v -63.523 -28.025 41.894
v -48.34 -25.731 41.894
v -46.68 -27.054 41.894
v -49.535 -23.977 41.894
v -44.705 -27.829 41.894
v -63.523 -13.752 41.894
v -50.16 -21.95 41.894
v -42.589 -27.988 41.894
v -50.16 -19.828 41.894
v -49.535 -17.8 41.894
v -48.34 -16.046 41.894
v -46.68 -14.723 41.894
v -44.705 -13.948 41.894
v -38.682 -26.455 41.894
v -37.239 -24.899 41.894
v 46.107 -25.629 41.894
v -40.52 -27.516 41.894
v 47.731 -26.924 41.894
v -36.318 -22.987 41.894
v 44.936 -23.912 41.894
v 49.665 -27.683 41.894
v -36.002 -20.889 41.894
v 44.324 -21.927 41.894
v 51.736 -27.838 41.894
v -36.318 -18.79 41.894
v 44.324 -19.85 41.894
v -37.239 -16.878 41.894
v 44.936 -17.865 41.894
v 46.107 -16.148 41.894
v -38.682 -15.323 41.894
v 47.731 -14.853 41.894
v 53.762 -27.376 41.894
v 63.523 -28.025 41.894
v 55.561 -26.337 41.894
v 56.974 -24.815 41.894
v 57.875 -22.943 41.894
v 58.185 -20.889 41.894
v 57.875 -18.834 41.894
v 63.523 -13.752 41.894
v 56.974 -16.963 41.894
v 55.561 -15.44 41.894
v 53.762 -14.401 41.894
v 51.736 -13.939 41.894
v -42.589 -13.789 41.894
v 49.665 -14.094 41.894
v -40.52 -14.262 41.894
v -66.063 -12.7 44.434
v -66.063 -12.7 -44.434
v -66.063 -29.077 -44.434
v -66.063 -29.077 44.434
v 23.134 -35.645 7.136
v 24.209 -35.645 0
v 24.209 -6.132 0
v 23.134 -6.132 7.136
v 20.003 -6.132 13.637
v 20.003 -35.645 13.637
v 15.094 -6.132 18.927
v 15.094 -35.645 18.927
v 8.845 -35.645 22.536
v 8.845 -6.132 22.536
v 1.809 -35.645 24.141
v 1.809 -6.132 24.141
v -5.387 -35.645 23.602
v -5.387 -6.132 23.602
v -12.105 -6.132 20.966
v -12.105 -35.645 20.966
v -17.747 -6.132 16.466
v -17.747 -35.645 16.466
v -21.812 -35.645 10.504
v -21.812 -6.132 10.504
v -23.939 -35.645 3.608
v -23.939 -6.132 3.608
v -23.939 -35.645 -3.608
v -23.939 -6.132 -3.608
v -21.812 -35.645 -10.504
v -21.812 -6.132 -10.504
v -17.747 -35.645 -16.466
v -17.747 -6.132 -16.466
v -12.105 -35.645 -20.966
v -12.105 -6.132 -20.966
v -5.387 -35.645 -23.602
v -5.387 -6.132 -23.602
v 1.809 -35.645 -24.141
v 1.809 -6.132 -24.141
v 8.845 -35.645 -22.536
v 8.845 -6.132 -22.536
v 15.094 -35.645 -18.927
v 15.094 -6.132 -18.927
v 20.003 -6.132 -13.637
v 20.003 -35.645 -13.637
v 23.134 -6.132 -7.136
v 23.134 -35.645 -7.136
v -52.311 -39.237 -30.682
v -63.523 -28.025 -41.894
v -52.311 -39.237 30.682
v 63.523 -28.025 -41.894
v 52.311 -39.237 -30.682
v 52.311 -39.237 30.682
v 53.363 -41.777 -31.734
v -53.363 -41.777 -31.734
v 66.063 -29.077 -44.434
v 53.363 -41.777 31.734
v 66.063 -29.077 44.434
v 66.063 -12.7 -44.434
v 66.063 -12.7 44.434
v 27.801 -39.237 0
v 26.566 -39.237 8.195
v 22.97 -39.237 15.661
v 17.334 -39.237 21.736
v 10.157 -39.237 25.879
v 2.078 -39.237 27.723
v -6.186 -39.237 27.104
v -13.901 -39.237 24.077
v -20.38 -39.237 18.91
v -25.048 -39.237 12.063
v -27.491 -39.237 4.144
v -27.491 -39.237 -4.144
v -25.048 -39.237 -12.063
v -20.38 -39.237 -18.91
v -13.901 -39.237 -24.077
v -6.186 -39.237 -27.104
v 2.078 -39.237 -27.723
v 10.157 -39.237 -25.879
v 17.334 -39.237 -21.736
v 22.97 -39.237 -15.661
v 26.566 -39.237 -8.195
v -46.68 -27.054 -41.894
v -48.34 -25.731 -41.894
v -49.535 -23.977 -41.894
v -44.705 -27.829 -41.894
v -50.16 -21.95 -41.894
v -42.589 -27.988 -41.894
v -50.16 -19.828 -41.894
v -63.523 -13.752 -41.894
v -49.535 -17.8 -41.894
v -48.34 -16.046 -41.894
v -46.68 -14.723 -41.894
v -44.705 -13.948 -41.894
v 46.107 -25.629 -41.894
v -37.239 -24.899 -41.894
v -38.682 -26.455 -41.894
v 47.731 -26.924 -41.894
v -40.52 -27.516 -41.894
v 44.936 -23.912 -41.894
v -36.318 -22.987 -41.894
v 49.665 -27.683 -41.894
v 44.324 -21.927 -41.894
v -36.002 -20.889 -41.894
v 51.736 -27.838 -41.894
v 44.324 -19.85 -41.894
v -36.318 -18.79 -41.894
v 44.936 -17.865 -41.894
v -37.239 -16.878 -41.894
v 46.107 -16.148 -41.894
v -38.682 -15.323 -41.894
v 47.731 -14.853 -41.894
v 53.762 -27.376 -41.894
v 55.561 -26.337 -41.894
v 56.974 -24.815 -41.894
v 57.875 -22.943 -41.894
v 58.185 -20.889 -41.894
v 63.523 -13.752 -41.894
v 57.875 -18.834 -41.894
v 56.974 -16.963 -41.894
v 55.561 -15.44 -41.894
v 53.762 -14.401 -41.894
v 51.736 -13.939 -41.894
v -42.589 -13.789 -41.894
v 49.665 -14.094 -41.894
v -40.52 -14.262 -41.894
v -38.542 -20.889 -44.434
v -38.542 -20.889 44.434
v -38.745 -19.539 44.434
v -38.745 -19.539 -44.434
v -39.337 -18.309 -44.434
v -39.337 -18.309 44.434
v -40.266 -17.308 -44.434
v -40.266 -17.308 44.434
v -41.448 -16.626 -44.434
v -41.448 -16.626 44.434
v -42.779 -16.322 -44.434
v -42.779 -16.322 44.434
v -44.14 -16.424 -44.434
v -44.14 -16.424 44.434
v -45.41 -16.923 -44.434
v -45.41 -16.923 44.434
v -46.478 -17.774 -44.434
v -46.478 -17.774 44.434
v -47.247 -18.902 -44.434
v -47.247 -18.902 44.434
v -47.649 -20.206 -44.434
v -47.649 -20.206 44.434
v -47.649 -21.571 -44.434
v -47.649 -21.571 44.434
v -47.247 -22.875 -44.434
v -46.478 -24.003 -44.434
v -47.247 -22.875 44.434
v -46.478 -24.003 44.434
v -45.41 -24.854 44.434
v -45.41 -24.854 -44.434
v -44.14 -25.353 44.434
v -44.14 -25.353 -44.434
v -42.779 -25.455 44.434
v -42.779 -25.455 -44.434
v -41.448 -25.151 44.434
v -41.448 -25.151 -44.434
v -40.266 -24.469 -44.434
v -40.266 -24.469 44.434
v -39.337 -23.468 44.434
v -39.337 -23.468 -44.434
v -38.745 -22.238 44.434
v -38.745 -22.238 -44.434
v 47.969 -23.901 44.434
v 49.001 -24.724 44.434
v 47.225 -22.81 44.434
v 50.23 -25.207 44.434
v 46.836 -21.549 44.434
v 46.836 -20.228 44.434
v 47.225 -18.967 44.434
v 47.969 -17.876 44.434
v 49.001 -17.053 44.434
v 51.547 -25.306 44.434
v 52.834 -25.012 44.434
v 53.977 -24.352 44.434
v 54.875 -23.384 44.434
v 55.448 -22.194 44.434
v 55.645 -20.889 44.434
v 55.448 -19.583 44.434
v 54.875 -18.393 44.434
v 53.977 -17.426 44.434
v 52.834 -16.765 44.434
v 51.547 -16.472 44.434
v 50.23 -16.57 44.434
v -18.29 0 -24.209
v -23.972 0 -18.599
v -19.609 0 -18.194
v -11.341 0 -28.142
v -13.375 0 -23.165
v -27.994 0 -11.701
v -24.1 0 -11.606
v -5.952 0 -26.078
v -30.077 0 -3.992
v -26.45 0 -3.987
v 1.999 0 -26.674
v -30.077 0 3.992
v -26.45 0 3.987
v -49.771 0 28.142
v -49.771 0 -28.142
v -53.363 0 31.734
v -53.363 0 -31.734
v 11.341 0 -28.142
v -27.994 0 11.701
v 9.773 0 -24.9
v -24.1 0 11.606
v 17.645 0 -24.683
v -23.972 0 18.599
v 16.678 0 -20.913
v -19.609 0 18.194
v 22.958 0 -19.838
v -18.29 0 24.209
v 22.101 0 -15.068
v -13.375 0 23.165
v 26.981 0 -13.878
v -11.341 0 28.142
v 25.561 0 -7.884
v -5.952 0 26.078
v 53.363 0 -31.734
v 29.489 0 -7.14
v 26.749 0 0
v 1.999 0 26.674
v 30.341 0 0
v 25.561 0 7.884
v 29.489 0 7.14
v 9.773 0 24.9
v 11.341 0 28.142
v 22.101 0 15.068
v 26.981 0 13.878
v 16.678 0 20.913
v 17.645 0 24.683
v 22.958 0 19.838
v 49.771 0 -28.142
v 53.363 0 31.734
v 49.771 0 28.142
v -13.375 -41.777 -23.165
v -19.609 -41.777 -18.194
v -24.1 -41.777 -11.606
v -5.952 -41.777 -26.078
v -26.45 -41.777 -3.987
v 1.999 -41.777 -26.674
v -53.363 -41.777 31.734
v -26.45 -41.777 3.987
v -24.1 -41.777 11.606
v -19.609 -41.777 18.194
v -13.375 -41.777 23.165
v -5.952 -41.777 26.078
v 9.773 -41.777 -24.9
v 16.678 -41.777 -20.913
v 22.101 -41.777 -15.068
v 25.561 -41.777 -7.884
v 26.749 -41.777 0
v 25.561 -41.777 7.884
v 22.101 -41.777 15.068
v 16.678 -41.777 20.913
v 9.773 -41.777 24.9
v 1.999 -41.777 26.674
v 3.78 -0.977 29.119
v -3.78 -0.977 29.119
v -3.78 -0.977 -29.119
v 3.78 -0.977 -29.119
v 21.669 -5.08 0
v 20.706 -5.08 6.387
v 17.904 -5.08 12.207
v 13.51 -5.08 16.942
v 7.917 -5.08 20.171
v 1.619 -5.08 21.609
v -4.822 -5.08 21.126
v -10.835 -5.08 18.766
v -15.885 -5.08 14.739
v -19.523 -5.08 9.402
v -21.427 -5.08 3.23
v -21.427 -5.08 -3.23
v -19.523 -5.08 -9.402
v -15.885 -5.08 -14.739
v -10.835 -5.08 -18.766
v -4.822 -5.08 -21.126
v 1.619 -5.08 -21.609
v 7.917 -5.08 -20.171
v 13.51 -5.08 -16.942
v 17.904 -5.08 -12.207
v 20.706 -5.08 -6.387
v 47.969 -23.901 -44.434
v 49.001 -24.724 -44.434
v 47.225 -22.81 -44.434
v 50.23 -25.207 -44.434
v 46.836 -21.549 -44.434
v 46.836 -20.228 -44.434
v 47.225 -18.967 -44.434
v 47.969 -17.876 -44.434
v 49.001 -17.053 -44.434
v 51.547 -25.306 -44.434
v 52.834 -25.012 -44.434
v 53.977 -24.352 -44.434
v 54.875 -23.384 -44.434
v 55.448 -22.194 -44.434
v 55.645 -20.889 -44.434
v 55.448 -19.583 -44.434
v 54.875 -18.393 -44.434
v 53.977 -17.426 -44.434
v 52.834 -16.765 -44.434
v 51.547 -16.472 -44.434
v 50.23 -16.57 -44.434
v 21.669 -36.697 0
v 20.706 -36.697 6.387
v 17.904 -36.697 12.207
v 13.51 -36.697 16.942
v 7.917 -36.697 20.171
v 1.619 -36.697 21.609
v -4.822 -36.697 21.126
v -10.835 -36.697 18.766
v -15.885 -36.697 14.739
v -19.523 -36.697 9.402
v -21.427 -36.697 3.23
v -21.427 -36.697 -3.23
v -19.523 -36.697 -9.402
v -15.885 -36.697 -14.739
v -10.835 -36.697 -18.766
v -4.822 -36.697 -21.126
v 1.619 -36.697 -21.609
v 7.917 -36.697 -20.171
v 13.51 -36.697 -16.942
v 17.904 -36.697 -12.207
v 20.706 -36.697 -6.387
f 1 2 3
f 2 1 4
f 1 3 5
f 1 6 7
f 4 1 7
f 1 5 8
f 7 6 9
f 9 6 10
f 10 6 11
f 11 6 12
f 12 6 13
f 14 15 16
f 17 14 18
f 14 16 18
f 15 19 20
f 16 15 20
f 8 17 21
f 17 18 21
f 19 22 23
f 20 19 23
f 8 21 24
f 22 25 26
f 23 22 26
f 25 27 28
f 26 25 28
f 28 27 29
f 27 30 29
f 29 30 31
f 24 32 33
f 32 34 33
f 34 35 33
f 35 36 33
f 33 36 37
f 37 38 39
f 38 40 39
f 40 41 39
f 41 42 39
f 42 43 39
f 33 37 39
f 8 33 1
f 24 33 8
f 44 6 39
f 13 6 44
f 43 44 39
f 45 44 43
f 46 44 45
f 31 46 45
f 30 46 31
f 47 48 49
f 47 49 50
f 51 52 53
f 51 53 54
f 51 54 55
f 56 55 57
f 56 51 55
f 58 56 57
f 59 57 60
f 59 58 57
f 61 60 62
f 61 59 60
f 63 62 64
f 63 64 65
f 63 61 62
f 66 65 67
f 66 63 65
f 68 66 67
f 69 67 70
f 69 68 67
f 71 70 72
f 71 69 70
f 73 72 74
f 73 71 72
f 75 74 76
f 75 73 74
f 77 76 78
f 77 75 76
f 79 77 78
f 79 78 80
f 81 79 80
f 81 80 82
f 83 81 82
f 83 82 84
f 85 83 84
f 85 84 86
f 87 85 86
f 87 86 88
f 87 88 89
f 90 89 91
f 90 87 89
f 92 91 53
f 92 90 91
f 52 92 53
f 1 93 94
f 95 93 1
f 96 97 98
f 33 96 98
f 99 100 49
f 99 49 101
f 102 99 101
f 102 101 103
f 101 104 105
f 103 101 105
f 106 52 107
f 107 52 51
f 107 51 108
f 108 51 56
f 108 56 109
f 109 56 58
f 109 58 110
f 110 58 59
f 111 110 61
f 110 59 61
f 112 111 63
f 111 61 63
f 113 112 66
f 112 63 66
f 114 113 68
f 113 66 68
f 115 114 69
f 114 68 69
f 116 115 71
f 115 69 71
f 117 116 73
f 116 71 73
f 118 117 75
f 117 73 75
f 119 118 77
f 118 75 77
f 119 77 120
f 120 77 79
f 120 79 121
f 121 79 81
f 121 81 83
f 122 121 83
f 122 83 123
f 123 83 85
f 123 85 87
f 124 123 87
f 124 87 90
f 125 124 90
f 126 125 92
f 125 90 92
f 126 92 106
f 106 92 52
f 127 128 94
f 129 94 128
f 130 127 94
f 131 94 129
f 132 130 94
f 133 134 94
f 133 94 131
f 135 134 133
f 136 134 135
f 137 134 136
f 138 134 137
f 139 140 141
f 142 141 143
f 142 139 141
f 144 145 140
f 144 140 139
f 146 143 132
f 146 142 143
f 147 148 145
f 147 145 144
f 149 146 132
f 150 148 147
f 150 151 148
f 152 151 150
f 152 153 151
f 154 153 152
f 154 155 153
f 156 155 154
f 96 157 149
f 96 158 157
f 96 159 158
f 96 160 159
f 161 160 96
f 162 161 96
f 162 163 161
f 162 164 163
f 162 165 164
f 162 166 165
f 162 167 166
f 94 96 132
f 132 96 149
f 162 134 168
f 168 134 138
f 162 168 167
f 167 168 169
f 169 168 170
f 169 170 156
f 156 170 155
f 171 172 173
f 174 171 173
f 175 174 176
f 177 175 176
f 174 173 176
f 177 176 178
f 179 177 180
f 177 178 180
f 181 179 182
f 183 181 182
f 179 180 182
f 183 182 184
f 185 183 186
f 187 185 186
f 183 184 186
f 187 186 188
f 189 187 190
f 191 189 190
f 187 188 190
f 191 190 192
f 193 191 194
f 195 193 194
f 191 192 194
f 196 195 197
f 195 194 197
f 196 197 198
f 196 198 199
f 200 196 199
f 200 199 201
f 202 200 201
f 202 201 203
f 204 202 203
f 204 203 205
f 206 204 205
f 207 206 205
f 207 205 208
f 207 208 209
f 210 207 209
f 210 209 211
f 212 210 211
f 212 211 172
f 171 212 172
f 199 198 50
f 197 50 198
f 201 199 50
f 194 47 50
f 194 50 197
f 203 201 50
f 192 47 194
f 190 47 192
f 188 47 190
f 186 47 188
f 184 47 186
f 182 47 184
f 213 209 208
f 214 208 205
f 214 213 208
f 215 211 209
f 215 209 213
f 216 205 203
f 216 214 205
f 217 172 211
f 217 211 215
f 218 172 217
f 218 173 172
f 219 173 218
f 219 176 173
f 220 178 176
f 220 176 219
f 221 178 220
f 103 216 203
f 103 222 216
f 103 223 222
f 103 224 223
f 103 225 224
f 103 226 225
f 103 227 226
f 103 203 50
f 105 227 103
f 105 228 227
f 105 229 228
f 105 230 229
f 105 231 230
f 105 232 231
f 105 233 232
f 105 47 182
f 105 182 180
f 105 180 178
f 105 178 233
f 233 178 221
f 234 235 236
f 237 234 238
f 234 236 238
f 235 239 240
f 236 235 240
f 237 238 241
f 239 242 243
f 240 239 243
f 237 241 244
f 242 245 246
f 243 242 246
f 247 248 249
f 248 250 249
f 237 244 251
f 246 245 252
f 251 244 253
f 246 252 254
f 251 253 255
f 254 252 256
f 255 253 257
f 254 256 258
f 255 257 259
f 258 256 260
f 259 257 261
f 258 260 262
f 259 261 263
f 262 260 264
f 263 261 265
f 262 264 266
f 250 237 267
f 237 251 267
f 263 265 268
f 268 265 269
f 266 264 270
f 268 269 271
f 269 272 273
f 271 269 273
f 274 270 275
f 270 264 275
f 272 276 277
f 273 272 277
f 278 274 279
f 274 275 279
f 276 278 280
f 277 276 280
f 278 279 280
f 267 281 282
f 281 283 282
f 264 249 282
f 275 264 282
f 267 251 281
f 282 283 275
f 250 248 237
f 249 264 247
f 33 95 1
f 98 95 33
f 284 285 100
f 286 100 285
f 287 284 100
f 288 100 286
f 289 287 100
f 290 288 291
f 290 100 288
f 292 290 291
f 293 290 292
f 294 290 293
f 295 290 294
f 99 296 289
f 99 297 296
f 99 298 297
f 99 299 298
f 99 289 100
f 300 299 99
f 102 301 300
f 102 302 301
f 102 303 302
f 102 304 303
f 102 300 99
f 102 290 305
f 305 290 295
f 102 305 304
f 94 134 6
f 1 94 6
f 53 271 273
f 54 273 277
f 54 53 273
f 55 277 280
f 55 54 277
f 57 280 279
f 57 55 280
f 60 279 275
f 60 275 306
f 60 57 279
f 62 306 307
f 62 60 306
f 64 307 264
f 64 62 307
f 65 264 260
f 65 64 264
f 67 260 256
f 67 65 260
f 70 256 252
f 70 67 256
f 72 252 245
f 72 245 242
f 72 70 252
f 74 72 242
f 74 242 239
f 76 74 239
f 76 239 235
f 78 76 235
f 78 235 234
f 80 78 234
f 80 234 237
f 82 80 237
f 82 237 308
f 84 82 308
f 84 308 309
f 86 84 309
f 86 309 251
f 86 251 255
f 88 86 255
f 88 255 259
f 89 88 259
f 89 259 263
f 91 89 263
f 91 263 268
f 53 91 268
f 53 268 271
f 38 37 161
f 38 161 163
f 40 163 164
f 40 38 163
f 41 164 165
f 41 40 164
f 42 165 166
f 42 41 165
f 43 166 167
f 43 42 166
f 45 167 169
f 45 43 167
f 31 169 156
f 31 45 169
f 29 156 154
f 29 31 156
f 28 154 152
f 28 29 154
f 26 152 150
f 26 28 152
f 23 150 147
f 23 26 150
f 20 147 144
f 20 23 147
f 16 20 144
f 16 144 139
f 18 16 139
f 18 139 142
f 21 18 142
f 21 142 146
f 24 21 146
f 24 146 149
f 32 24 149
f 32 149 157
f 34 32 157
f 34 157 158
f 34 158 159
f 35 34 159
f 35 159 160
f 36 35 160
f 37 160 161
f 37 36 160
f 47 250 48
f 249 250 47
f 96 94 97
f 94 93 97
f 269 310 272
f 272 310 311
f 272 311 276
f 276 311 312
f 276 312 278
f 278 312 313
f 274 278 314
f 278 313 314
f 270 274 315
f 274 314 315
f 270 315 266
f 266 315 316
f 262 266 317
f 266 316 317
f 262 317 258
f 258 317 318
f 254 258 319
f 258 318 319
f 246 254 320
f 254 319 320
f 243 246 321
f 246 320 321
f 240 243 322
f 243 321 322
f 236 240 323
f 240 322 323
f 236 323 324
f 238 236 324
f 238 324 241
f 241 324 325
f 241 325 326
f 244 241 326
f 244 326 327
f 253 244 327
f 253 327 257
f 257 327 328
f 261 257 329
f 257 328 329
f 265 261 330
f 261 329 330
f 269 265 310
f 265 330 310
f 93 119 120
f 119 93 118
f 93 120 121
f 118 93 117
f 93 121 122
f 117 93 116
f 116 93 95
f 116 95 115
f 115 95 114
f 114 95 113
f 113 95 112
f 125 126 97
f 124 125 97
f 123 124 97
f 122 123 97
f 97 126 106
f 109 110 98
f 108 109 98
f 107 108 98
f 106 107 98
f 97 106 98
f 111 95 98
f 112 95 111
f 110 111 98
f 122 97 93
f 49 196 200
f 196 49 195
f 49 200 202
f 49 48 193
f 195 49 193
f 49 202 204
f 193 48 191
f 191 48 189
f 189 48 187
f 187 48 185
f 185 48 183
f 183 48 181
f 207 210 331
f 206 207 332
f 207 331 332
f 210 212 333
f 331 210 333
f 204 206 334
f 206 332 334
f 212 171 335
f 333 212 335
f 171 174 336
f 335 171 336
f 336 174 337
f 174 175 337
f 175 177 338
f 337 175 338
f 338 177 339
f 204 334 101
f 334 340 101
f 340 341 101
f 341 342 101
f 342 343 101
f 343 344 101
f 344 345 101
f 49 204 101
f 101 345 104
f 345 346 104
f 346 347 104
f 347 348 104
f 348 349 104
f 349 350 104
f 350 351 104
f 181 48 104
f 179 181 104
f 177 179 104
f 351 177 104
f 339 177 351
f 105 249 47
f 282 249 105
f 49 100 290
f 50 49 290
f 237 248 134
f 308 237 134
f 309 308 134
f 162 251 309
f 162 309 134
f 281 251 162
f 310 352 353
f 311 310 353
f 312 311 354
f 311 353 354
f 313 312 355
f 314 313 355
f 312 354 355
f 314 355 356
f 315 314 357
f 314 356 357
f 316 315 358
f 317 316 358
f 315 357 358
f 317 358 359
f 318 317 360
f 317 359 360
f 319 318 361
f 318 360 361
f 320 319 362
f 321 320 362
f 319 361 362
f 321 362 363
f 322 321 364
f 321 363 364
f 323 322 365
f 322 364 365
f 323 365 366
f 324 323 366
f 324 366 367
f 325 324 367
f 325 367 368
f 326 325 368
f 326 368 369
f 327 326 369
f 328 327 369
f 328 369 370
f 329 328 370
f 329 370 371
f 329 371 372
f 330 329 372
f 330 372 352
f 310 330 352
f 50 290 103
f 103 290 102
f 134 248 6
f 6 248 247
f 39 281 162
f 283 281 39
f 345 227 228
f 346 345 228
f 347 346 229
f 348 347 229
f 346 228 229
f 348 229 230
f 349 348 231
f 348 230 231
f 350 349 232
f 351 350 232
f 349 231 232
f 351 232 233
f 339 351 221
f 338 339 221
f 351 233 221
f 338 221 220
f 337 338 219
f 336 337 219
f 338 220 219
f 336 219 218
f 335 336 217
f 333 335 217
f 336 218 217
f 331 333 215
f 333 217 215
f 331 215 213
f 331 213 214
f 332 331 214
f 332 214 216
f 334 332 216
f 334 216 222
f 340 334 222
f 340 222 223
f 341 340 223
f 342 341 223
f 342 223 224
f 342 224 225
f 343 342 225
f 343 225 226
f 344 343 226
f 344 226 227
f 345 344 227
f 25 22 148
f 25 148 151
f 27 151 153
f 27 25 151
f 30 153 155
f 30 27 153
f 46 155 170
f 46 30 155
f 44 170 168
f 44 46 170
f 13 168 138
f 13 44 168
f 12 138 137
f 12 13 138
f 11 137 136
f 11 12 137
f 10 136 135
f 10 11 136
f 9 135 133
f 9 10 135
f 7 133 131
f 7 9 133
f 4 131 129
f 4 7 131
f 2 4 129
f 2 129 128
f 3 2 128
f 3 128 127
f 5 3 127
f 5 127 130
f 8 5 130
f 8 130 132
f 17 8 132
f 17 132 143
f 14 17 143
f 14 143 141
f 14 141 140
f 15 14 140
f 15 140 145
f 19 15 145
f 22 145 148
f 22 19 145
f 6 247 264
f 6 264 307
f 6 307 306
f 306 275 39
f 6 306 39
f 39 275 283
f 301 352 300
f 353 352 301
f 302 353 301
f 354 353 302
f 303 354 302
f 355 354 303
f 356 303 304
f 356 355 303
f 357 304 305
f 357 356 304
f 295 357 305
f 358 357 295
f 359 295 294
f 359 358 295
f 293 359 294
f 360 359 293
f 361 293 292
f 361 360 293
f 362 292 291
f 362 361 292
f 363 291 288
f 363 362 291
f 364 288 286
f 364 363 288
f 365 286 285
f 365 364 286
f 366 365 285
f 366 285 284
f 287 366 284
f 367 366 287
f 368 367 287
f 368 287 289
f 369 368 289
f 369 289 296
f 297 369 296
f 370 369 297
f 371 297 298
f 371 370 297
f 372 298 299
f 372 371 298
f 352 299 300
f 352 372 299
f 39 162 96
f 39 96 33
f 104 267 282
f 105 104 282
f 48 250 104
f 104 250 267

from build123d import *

# Parameters (mm, degrees)
F0_W     = 132.1267485619
F0_H     = 88.8679325581
F1_DEPTH = 41.7771711946
F2_SIZE  = 12.7
F3_R     = 21.6691340714
F4_DEPTH = 276.723921299
F5_SIZE  = 5.08
F6_R     = 4.579207341
F7_DEPTH = 88.8689325581
F6_R_2   = 4.4293082264
F8_DEPTH = 88.8689325581
F9_T     = -2.54


with BuildPart() as f1:
    # F0 (on Front) → F1 (new body)
    with BuildSketch(Plane.XZ):
        Rectangle(F0_W, F0_H)
    extrude(amount=F1_DEPTH)

    # F2
    f2_edges = [f1.edges().sort_by_distance(p)[0] for p in [
        (0, -41.777171, -44.433966),
        (66.063374, -41.777171, 0),
        (0, -41.777171, 44.433966),
        (-66.063374, -41.777171, 0),
        (0, 0, -44.433966),
        (66.063374, 0, 0),
        (-66.063374, 0, 0),
        (0, 0, 44.433966),
    ]]
    chamfer(f2_edges, length=F2_SIZE)

    # F3 (on face) → F4 (cut)
    with BuildSketch(Plane.XZ.offset(41.7771711946)):
        Circle(F3_R)
    extrude(amount=-F4_DEPTH, mode=Mode.SUBTRACT)

    # F5
    f5_edges = [f1.edges().sort_by_distance(p)[0] for p in [
        (-21.669134, 0, 0),
        (-21.669134, -41.777171, 0),
    ]]
    chamfer(f5_edges, length=F5_SIZE)

    # F6 (on face) → F7 (cut, through all)
    with BuildSketch(Plane.XY.offset(44.433966279)):
        with Locations((-43.1207939982, -20.8885855973)):
            Circle(F6_R)
    extrude(amount=-F7_DEPTH, mode=Mode.SUBTRACT)

    # F6 (on face) → F8 (cut, through all)
    with BuildSketch(Plane.XY.offset(44.433966279)):
        with Locations((-43.1207939982, -20.8885855973)):
            Circle(F6_R)
        with Locations((51.215508439, -20.8885855973)):
            Circle(F6_R_2)
    extrude(amount=-F8_DEPTH, mode=Mode.SUBTRACT)

    # F9
    f9_openings = [f1.faces().sort_by_distance(p)[0] for p in [
        (-27.990858, 0, 0),
    ]]
    offset(amount=F9_T, openings=f9_openings)


solid = f1.part
